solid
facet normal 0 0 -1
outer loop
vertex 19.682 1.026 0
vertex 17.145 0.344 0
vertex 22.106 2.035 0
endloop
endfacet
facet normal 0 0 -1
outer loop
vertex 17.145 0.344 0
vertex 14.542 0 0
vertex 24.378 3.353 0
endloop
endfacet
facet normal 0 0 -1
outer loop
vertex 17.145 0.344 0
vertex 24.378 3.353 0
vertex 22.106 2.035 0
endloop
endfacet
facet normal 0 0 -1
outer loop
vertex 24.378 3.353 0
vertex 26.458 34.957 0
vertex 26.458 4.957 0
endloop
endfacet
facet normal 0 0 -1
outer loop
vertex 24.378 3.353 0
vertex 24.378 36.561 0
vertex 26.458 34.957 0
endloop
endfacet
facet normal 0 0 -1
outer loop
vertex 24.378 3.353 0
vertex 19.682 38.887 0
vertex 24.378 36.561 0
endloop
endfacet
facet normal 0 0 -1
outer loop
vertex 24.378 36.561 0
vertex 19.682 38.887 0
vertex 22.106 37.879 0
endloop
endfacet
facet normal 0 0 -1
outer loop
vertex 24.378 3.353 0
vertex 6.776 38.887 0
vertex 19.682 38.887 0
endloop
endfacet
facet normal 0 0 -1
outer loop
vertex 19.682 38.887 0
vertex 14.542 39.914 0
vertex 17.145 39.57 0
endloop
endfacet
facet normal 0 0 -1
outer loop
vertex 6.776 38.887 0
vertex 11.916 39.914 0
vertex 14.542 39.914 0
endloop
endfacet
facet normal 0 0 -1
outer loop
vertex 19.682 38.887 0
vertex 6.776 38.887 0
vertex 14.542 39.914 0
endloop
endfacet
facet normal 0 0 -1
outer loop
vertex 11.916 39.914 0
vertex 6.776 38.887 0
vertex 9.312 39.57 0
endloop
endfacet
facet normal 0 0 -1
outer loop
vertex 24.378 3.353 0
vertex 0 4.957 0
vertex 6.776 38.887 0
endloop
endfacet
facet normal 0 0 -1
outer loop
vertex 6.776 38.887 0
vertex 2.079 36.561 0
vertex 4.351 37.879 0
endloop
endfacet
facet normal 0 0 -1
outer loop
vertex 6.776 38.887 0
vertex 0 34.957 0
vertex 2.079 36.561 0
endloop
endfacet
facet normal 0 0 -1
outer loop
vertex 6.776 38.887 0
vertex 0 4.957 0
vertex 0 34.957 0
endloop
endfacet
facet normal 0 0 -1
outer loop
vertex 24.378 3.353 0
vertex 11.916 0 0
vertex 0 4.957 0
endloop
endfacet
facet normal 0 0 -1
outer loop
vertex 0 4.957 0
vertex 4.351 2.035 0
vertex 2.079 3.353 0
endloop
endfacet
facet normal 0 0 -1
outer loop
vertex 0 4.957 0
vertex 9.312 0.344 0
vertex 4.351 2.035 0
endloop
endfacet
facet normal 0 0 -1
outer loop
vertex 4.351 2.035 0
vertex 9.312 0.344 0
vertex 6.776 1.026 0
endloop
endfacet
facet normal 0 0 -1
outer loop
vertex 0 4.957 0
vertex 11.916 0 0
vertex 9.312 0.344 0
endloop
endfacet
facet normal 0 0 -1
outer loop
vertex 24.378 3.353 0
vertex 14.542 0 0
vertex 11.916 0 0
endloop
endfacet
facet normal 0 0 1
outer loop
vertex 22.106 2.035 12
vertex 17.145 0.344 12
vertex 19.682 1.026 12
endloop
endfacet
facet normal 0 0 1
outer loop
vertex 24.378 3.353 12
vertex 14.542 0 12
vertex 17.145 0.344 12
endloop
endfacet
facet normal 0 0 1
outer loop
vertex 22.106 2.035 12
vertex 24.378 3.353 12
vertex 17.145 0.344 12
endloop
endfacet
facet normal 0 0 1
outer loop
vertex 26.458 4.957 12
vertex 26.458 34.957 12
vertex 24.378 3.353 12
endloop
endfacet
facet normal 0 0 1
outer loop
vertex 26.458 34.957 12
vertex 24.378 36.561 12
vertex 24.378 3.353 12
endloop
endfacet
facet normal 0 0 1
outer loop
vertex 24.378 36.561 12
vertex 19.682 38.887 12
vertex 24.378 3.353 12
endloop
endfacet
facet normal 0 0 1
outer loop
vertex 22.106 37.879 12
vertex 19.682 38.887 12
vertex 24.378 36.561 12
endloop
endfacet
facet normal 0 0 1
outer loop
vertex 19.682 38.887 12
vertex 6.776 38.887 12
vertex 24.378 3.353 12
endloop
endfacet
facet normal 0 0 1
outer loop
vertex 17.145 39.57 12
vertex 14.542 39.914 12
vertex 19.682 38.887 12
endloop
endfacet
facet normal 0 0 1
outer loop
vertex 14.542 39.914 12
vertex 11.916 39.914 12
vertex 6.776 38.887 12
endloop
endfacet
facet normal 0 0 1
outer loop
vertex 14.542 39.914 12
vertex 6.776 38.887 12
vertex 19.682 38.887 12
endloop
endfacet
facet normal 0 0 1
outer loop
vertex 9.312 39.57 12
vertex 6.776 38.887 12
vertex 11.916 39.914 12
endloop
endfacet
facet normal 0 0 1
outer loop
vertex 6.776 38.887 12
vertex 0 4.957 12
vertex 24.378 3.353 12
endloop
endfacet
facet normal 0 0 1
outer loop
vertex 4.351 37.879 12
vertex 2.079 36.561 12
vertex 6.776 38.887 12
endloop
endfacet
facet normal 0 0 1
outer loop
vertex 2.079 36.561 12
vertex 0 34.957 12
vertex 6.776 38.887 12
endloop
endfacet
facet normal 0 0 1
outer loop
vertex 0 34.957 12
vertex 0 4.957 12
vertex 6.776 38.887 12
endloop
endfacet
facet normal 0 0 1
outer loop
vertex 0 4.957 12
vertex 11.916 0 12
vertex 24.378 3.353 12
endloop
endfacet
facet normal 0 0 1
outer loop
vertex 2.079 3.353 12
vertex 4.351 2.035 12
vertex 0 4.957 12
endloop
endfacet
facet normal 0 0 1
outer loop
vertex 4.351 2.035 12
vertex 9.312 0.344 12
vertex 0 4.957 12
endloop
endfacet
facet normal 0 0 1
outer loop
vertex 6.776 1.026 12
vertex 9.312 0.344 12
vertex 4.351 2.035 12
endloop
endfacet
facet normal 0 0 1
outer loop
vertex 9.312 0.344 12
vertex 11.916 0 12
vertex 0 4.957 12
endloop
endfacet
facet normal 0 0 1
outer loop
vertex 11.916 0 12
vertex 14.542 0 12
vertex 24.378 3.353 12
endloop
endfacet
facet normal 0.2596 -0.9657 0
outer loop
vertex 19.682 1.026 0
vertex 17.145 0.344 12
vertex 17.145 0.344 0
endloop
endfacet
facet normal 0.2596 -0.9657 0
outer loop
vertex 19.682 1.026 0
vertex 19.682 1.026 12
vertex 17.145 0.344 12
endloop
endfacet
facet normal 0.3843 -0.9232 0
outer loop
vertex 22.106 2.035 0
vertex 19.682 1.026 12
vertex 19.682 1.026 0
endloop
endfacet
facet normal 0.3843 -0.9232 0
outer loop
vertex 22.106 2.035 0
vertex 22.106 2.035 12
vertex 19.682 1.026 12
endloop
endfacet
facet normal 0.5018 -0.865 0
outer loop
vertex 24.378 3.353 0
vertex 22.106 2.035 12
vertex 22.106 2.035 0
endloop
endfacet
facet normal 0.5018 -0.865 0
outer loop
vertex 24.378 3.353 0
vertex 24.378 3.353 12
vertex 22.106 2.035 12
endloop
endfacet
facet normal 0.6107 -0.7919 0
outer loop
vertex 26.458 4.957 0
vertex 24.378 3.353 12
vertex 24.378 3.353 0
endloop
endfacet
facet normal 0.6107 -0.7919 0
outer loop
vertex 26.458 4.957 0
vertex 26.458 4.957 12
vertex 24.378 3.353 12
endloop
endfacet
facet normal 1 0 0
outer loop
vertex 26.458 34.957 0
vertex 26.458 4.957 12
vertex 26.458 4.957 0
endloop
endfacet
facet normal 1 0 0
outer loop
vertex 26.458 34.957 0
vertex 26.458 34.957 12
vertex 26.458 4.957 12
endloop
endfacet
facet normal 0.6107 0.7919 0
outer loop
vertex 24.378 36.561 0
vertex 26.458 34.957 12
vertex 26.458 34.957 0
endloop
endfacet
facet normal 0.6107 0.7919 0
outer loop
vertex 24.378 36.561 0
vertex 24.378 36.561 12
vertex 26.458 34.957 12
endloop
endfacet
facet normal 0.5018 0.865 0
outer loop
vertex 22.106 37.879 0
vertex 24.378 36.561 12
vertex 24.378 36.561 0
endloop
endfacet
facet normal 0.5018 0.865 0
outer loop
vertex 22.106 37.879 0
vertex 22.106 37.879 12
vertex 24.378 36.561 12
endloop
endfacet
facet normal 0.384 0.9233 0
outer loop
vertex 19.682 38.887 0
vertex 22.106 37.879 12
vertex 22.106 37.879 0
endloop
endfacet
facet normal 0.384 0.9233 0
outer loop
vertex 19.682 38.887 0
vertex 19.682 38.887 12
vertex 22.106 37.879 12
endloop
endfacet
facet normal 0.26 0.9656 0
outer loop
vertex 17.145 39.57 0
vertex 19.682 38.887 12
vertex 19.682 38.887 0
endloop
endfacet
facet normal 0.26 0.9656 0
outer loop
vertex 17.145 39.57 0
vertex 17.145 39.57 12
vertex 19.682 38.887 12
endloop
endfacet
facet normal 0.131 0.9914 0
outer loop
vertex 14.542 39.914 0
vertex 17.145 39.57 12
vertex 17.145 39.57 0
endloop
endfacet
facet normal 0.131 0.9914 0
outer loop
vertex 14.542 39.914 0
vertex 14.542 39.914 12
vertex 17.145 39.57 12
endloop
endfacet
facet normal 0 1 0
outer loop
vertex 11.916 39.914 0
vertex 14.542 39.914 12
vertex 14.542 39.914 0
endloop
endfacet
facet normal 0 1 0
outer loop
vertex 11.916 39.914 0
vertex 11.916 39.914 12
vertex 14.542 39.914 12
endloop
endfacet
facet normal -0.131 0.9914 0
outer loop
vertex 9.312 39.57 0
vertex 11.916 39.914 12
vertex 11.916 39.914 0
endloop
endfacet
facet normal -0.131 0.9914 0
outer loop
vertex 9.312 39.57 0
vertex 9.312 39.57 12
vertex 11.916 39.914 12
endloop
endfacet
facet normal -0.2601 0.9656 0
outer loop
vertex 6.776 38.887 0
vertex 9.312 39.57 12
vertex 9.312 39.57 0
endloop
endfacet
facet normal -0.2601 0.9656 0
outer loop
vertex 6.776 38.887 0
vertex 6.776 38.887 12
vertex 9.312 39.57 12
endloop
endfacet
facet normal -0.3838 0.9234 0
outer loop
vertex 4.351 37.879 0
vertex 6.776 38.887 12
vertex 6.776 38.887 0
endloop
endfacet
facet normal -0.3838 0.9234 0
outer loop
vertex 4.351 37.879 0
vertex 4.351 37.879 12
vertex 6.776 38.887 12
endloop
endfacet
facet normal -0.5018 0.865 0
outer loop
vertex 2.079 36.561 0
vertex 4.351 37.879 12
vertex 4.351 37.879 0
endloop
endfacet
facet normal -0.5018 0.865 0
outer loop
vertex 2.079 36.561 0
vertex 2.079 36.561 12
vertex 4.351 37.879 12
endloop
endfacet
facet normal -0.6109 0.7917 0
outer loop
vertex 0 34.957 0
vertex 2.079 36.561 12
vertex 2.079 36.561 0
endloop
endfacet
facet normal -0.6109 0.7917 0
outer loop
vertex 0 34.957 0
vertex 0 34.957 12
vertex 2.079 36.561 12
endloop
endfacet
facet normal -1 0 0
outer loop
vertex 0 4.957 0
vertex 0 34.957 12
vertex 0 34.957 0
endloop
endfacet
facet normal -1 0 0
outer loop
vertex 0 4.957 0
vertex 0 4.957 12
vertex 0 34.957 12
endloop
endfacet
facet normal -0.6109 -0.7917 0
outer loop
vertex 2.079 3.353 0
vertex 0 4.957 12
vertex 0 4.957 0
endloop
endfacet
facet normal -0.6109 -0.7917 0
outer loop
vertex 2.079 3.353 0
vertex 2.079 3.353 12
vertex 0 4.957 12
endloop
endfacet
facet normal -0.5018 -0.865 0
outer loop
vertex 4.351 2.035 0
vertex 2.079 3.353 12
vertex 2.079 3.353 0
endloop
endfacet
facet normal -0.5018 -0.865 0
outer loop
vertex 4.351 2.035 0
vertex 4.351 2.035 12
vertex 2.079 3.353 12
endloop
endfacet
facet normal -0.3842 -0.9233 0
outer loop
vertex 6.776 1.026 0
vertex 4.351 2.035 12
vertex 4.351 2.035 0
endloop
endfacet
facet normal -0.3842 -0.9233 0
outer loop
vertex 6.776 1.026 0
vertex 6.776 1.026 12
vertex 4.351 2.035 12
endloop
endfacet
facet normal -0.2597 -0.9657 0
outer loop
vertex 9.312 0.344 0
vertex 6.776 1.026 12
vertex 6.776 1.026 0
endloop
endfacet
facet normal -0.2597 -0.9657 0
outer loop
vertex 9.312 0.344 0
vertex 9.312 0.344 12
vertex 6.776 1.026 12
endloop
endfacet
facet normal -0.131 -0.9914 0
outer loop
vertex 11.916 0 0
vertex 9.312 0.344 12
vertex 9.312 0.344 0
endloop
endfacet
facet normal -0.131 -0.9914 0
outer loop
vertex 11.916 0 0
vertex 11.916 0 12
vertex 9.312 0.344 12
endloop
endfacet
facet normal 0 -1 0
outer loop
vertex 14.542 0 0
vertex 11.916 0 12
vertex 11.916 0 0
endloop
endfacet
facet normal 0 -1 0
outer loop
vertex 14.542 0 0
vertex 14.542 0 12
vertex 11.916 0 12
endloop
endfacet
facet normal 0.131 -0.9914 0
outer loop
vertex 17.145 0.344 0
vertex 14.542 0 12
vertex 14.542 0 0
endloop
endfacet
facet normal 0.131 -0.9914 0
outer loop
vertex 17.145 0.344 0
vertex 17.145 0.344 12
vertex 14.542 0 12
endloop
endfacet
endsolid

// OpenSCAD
$fn = 32;

// ----------------------------------------------------------------------
// Eccentric disc: double_d, 12 mm thick
// ----------------------------------------------------------------------

// --- parameters (mm) ---
profile_height = 12;      // extrusion height
profile_points = 24;      // points of the closed outline

profile = [[26.458, 34.957], [24.378, 36.561], [22.106, 37.879], [19.682, 38.887], [17.145, 39.57], [14.542, 39.914], [11.916, 39.914], [9.312, 39.57], [6.776, 38.887], [4.351, 37.879], [2.079, 36.561], [0, 34.957], [0, 4.957], [2.079, 3.353], [4.351, 2.035], [6.776, 1.026], [9.312, 0.344], [11.916, 0], [14.542, 0], [17.145, 0.344], [19.682, 1.026], [22.106, 2.035], [24.378, 3.353], [26.458, 4.957]];  // single closed polygon, 24 points, counter clockwise

// --- the one profile operation ---
linear_extrude(height = profile_height) polygon(points = profile);
